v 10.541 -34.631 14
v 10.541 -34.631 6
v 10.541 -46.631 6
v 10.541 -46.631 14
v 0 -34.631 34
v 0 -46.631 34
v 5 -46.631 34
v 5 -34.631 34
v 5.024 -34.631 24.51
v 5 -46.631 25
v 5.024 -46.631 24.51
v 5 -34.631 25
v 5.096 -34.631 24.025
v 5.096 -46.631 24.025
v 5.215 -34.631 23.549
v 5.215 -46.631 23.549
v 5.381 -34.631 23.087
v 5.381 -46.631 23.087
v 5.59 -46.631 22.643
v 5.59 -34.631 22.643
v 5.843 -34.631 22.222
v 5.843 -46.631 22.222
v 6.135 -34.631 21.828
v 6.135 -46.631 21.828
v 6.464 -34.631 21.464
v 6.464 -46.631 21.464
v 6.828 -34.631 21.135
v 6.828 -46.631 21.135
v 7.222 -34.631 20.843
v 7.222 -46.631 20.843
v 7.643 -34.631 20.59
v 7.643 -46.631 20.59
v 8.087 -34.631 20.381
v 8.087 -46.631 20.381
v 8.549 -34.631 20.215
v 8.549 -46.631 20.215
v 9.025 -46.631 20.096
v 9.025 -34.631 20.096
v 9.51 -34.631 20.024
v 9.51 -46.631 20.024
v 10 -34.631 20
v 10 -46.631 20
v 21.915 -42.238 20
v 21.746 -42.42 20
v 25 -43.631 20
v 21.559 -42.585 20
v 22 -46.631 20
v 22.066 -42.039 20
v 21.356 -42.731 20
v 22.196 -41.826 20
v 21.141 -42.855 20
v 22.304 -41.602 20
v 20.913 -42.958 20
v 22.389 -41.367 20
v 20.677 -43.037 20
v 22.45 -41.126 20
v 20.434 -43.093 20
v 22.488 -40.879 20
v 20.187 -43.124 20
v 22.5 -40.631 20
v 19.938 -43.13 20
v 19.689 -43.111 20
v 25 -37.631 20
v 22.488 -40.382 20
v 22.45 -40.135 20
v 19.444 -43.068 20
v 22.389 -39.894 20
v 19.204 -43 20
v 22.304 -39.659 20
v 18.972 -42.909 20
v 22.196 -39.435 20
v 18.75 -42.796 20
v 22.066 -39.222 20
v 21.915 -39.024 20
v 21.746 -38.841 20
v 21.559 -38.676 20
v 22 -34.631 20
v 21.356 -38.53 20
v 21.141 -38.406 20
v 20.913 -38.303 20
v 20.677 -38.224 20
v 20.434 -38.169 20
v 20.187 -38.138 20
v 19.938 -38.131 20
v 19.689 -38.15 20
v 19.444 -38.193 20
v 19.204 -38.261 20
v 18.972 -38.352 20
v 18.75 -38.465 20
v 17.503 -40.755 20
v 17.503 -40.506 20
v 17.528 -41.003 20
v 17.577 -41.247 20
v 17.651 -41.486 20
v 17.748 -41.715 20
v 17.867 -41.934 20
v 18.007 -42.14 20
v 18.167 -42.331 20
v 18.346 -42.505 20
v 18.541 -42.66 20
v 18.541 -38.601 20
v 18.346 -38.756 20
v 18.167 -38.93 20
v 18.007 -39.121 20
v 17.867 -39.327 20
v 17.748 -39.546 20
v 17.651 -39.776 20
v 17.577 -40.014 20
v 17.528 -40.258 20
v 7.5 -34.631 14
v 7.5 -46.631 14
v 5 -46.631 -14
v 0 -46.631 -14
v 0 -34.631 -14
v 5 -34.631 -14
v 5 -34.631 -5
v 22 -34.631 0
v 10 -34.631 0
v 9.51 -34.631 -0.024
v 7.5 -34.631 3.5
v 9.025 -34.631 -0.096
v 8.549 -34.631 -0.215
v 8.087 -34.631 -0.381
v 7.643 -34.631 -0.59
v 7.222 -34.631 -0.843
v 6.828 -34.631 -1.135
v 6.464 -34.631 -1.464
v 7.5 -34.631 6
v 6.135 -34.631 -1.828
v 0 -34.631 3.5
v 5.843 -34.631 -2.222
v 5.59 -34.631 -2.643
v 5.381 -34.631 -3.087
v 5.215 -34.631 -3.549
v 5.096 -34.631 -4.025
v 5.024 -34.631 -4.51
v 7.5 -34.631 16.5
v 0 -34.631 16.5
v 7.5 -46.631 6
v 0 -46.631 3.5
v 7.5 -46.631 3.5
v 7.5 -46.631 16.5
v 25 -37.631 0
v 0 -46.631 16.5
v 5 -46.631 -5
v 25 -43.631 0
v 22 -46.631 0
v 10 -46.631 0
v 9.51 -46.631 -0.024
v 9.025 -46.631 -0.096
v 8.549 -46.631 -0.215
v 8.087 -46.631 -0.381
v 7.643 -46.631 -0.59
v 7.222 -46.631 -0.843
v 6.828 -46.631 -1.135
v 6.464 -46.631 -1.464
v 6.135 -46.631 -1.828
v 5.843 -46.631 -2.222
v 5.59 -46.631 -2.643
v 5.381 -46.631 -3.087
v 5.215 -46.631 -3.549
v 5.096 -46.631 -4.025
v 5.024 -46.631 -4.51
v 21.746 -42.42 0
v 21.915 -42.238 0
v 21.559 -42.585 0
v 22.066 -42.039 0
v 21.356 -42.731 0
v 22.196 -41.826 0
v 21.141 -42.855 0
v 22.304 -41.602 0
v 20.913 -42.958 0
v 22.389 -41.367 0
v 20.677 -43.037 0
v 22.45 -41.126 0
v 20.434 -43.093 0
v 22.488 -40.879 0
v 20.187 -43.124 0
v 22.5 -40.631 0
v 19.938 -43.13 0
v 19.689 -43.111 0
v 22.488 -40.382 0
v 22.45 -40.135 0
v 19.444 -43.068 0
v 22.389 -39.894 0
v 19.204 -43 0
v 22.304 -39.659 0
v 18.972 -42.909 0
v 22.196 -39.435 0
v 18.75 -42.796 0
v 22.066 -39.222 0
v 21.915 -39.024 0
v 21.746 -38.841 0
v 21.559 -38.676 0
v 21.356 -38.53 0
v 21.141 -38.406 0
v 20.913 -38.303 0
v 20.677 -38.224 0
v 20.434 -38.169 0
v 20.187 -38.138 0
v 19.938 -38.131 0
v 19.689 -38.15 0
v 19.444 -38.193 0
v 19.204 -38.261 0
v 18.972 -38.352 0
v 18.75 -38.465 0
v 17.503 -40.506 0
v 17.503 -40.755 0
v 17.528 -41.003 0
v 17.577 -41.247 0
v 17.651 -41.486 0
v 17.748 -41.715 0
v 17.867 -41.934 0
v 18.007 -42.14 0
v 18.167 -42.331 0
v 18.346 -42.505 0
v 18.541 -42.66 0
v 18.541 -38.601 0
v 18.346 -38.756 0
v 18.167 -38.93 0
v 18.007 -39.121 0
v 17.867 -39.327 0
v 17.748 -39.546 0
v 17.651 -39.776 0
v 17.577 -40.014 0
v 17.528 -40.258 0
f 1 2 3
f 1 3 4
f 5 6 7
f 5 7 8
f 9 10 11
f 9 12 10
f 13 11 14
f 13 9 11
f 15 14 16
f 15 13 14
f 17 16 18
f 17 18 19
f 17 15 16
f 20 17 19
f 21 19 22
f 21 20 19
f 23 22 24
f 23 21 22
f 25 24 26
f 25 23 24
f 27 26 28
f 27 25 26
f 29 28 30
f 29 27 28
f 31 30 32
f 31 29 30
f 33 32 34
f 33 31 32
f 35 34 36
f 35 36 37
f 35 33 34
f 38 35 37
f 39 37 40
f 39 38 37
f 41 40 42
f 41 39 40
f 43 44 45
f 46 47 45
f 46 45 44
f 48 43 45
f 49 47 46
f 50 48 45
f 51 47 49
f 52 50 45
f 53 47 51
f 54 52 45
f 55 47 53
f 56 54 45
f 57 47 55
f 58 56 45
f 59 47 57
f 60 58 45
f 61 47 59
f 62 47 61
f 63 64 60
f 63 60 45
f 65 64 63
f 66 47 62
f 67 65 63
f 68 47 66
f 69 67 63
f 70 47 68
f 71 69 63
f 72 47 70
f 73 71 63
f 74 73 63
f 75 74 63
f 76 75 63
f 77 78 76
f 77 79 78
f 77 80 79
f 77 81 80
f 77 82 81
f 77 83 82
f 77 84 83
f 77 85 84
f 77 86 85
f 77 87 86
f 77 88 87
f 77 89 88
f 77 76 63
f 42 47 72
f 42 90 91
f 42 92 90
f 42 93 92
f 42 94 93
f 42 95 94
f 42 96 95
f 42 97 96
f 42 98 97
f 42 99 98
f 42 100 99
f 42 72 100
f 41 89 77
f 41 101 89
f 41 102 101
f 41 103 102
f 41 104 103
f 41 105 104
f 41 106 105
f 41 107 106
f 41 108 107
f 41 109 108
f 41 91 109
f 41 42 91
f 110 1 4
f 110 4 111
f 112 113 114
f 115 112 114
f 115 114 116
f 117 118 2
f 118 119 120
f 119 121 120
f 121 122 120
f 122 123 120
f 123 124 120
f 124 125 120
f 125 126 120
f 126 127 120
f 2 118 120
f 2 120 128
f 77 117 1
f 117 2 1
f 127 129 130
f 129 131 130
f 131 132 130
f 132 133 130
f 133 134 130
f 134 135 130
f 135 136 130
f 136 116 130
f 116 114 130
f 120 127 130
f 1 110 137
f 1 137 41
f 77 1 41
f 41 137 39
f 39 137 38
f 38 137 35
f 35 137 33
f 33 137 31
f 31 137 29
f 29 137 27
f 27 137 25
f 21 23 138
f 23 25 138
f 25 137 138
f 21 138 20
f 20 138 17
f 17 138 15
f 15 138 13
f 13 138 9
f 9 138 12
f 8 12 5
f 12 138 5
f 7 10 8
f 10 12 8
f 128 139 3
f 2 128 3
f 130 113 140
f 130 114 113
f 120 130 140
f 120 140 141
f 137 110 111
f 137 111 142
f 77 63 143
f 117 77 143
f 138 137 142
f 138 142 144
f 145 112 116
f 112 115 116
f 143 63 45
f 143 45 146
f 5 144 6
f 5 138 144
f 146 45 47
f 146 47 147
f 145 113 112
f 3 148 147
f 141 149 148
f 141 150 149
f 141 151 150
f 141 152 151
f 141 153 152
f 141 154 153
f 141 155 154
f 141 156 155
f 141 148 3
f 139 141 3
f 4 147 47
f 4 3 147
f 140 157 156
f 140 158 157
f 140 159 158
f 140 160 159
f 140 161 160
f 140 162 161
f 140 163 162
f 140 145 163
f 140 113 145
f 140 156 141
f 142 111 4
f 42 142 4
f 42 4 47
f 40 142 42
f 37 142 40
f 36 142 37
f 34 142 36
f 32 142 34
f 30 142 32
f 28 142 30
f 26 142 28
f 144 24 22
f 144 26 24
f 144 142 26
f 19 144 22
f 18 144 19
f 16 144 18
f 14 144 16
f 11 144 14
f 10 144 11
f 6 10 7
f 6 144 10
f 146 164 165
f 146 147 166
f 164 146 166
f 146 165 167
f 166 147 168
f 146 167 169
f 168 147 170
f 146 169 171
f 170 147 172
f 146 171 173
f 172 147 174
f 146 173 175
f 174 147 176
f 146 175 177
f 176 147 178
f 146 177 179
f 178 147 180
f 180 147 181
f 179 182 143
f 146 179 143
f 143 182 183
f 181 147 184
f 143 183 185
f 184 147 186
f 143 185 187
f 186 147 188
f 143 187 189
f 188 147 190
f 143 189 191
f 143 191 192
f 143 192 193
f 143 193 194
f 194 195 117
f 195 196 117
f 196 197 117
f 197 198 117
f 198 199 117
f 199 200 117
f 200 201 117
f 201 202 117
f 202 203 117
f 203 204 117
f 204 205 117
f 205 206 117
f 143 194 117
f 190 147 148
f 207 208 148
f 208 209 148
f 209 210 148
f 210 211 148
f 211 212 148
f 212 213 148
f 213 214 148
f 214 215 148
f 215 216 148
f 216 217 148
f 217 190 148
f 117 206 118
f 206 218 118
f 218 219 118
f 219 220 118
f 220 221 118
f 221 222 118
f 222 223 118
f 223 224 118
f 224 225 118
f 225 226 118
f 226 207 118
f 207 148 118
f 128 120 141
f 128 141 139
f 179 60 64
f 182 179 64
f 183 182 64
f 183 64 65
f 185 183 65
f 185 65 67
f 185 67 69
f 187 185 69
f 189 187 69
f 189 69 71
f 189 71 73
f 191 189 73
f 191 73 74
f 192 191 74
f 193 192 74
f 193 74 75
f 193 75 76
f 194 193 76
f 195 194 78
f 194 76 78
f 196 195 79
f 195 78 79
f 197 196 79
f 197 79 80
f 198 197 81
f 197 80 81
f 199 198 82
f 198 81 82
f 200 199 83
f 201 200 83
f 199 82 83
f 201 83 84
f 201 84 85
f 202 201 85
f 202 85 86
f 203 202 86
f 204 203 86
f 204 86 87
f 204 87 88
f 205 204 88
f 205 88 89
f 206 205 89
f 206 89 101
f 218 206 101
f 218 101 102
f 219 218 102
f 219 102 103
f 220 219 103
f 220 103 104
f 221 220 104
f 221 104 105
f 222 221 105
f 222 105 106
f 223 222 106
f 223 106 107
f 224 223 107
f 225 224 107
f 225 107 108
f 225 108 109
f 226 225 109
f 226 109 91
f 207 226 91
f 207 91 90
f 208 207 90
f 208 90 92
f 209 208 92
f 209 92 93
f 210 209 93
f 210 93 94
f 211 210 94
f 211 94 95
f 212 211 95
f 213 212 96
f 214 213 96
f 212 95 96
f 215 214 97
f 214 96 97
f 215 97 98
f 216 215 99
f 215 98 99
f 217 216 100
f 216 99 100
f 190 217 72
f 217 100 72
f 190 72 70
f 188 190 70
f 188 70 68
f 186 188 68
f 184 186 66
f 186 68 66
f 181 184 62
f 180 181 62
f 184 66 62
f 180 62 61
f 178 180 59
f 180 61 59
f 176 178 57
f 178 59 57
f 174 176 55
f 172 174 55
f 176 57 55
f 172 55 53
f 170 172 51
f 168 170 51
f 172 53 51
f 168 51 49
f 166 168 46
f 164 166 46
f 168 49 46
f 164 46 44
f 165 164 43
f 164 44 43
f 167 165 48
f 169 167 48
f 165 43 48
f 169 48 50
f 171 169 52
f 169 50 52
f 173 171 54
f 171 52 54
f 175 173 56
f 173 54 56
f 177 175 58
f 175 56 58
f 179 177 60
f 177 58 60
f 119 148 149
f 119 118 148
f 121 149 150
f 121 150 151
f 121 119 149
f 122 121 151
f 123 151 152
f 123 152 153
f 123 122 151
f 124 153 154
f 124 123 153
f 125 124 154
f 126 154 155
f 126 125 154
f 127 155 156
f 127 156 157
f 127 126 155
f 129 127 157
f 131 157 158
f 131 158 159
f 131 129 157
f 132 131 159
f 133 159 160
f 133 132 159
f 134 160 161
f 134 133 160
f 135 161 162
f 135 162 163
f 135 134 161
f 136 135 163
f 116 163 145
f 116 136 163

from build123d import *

# Parameters (mm, degrees)
SKETCH_1_W          = 20
SKETCH_1_H          = 12
EXTRUDE_1_DEPTH     = 25
SKETCH_5_R          = 2.5
CUT_EXTRUDE_2_DEPTH = 57.563315968
SKETCH_6_W          = 14
SKETCH_6_H          = 12
EXTRUDE_2_DEPTH     = 5
CHAMFER_1_SIZE      = 3
CUT_EXTRUDE_3_DEPTH = 44.874821937
FILLET_1_R          = 5


with BuildPart() as part:
    # Эскиз1 → Вытянуть1 (new body)
    with BuildSketch(Plane(origin=(0, 0, 0), x_dir=(0, 0, -1), z_dir=(1, 0, 0))):
        with Locations((-10, -40.630555576)):
            Rectangle(SKETCH_1_W, SKETCH_1_H)
    extrude(amount=EXTRUDE_1_DEPTH)

    # Эскиз5 → Вырез-Вытянуть2 (cut, through all)
    with BuildSketch(Plane.XY.offset(20)):
        with Locations((20, -40.630555576)):
            Circle(SKETCH_5_R)
    extrude(amount=-CUT_EXTRUDE_2_DEPTH, mode=Mode.SUBTRACT)

    # Эскиз6 → Вытянуть2 (add)
    with BuildSketch(Plane.ZY):
        with Locations((27, -40.630555576)):
            Rectangle(SKETCH_6_W, SKETCH_6_H)
        with Locations((-7, -40.630555576)):
            Rectangle(SKETCH_6_W, SKETCH_6_H)
    extrude(amount=-EXTRUDE_2_DEPTH)

    # Фаска1
    chamfer_1_edges = [part.edges().sort_by_distance(p)[0] for p in [
        (25, -46.630555576, 10),
        (25, -34.630555576, 10),
    ]]
    chamfer(chamfer_1_edges, length=CHAMFER_1_SIZE)

    # Эскиз8 → Вытянуть3 (cut, through all)
    with BuildSketch(Plane(origin=(0, -34.630555576, 0), x_dir=(1, 0, 0), z_dir=(0, 1, 0))):
        Polygon((-15.5, -3.5), (7.5, -3.5), (7.5, -6), (10.541246576, -6), (10.541246576, -14), (7.5, -14), (7.5, -16.5), (-15.5, -16.5), align=None)
    extrude(amount=-CUT_EXTRUDE_3_DEPTH, mode=Mode.SUBTRACT)

    # Скругление1
    fillet_1_edges = [part.edges().sort_by_distance(p)[0] for p in [
        (5, -40.630555576, 0),
        (5, -40.630555576, 20),
    ]]
    fillet(fillet_1_edges, radius=FILLET_1_R)


solid = part.part
